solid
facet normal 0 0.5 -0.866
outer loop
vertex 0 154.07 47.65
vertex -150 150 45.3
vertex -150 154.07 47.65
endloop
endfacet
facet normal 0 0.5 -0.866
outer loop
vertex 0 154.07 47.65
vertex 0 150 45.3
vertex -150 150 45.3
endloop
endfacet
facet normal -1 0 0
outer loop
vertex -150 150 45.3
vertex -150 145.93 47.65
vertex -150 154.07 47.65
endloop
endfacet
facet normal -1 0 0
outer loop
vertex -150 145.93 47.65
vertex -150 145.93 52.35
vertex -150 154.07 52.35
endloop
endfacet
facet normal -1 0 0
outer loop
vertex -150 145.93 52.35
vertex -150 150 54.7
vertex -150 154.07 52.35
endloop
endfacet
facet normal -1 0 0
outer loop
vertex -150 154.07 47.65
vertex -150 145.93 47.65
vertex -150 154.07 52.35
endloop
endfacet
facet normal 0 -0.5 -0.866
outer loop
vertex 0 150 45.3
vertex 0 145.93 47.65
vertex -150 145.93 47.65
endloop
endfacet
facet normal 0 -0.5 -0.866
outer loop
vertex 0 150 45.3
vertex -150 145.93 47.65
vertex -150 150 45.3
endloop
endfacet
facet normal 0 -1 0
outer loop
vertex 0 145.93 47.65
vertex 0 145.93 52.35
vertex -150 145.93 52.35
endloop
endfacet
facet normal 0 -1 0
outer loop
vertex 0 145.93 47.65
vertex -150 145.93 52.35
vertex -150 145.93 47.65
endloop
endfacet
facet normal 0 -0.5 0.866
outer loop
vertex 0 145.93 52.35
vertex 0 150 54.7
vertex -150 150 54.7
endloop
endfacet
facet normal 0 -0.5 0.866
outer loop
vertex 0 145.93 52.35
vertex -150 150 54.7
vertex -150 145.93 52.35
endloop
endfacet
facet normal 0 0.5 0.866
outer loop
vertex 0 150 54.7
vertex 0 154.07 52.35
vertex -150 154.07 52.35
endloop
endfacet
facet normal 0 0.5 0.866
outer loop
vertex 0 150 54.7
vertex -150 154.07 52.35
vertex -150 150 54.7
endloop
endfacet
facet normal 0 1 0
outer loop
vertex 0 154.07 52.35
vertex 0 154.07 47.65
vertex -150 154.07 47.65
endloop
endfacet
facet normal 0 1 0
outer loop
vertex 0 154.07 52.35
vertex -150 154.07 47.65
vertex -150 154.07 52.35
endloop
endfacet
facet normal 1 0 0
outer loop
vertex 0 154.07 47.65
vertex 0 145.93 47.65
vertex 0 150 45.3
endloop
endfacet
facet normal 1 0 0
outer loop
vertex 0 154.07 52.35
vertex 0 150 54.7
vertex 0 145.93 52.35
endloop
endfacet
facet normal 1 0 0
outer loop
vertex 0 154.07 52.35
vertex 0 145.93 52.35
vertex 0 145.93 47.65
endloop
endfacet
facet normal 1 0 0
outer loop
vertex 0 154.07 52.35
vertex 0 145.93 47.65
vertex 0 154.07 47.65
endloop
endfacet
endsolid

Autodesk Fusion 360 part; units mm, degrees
sketch "Sketch1" plane through (0, 0, 0) normal (1, 0, 0) x (0, 1, 0)
  line L0 (150, 45.3) -> (154.0703, 47.65)
  line L1 (154.0703, 47.65) -> (154.0703, 52.35)
  line L2 (154.0703, 52.35) -> (150, 54.7)
  line L3 (150, 54.7) -> (145.9297, 52.35)
  line L4 (145.9297, 52.35) -> (145.9297, 47.65)
  line L5 (145.9297, 47.65) -> (150, 45.3)
  point P0 (150, 50)
  dimension "d1" = 4.7
extrude "Extrude1" add sketch "Sketch1" against normal blind 150
